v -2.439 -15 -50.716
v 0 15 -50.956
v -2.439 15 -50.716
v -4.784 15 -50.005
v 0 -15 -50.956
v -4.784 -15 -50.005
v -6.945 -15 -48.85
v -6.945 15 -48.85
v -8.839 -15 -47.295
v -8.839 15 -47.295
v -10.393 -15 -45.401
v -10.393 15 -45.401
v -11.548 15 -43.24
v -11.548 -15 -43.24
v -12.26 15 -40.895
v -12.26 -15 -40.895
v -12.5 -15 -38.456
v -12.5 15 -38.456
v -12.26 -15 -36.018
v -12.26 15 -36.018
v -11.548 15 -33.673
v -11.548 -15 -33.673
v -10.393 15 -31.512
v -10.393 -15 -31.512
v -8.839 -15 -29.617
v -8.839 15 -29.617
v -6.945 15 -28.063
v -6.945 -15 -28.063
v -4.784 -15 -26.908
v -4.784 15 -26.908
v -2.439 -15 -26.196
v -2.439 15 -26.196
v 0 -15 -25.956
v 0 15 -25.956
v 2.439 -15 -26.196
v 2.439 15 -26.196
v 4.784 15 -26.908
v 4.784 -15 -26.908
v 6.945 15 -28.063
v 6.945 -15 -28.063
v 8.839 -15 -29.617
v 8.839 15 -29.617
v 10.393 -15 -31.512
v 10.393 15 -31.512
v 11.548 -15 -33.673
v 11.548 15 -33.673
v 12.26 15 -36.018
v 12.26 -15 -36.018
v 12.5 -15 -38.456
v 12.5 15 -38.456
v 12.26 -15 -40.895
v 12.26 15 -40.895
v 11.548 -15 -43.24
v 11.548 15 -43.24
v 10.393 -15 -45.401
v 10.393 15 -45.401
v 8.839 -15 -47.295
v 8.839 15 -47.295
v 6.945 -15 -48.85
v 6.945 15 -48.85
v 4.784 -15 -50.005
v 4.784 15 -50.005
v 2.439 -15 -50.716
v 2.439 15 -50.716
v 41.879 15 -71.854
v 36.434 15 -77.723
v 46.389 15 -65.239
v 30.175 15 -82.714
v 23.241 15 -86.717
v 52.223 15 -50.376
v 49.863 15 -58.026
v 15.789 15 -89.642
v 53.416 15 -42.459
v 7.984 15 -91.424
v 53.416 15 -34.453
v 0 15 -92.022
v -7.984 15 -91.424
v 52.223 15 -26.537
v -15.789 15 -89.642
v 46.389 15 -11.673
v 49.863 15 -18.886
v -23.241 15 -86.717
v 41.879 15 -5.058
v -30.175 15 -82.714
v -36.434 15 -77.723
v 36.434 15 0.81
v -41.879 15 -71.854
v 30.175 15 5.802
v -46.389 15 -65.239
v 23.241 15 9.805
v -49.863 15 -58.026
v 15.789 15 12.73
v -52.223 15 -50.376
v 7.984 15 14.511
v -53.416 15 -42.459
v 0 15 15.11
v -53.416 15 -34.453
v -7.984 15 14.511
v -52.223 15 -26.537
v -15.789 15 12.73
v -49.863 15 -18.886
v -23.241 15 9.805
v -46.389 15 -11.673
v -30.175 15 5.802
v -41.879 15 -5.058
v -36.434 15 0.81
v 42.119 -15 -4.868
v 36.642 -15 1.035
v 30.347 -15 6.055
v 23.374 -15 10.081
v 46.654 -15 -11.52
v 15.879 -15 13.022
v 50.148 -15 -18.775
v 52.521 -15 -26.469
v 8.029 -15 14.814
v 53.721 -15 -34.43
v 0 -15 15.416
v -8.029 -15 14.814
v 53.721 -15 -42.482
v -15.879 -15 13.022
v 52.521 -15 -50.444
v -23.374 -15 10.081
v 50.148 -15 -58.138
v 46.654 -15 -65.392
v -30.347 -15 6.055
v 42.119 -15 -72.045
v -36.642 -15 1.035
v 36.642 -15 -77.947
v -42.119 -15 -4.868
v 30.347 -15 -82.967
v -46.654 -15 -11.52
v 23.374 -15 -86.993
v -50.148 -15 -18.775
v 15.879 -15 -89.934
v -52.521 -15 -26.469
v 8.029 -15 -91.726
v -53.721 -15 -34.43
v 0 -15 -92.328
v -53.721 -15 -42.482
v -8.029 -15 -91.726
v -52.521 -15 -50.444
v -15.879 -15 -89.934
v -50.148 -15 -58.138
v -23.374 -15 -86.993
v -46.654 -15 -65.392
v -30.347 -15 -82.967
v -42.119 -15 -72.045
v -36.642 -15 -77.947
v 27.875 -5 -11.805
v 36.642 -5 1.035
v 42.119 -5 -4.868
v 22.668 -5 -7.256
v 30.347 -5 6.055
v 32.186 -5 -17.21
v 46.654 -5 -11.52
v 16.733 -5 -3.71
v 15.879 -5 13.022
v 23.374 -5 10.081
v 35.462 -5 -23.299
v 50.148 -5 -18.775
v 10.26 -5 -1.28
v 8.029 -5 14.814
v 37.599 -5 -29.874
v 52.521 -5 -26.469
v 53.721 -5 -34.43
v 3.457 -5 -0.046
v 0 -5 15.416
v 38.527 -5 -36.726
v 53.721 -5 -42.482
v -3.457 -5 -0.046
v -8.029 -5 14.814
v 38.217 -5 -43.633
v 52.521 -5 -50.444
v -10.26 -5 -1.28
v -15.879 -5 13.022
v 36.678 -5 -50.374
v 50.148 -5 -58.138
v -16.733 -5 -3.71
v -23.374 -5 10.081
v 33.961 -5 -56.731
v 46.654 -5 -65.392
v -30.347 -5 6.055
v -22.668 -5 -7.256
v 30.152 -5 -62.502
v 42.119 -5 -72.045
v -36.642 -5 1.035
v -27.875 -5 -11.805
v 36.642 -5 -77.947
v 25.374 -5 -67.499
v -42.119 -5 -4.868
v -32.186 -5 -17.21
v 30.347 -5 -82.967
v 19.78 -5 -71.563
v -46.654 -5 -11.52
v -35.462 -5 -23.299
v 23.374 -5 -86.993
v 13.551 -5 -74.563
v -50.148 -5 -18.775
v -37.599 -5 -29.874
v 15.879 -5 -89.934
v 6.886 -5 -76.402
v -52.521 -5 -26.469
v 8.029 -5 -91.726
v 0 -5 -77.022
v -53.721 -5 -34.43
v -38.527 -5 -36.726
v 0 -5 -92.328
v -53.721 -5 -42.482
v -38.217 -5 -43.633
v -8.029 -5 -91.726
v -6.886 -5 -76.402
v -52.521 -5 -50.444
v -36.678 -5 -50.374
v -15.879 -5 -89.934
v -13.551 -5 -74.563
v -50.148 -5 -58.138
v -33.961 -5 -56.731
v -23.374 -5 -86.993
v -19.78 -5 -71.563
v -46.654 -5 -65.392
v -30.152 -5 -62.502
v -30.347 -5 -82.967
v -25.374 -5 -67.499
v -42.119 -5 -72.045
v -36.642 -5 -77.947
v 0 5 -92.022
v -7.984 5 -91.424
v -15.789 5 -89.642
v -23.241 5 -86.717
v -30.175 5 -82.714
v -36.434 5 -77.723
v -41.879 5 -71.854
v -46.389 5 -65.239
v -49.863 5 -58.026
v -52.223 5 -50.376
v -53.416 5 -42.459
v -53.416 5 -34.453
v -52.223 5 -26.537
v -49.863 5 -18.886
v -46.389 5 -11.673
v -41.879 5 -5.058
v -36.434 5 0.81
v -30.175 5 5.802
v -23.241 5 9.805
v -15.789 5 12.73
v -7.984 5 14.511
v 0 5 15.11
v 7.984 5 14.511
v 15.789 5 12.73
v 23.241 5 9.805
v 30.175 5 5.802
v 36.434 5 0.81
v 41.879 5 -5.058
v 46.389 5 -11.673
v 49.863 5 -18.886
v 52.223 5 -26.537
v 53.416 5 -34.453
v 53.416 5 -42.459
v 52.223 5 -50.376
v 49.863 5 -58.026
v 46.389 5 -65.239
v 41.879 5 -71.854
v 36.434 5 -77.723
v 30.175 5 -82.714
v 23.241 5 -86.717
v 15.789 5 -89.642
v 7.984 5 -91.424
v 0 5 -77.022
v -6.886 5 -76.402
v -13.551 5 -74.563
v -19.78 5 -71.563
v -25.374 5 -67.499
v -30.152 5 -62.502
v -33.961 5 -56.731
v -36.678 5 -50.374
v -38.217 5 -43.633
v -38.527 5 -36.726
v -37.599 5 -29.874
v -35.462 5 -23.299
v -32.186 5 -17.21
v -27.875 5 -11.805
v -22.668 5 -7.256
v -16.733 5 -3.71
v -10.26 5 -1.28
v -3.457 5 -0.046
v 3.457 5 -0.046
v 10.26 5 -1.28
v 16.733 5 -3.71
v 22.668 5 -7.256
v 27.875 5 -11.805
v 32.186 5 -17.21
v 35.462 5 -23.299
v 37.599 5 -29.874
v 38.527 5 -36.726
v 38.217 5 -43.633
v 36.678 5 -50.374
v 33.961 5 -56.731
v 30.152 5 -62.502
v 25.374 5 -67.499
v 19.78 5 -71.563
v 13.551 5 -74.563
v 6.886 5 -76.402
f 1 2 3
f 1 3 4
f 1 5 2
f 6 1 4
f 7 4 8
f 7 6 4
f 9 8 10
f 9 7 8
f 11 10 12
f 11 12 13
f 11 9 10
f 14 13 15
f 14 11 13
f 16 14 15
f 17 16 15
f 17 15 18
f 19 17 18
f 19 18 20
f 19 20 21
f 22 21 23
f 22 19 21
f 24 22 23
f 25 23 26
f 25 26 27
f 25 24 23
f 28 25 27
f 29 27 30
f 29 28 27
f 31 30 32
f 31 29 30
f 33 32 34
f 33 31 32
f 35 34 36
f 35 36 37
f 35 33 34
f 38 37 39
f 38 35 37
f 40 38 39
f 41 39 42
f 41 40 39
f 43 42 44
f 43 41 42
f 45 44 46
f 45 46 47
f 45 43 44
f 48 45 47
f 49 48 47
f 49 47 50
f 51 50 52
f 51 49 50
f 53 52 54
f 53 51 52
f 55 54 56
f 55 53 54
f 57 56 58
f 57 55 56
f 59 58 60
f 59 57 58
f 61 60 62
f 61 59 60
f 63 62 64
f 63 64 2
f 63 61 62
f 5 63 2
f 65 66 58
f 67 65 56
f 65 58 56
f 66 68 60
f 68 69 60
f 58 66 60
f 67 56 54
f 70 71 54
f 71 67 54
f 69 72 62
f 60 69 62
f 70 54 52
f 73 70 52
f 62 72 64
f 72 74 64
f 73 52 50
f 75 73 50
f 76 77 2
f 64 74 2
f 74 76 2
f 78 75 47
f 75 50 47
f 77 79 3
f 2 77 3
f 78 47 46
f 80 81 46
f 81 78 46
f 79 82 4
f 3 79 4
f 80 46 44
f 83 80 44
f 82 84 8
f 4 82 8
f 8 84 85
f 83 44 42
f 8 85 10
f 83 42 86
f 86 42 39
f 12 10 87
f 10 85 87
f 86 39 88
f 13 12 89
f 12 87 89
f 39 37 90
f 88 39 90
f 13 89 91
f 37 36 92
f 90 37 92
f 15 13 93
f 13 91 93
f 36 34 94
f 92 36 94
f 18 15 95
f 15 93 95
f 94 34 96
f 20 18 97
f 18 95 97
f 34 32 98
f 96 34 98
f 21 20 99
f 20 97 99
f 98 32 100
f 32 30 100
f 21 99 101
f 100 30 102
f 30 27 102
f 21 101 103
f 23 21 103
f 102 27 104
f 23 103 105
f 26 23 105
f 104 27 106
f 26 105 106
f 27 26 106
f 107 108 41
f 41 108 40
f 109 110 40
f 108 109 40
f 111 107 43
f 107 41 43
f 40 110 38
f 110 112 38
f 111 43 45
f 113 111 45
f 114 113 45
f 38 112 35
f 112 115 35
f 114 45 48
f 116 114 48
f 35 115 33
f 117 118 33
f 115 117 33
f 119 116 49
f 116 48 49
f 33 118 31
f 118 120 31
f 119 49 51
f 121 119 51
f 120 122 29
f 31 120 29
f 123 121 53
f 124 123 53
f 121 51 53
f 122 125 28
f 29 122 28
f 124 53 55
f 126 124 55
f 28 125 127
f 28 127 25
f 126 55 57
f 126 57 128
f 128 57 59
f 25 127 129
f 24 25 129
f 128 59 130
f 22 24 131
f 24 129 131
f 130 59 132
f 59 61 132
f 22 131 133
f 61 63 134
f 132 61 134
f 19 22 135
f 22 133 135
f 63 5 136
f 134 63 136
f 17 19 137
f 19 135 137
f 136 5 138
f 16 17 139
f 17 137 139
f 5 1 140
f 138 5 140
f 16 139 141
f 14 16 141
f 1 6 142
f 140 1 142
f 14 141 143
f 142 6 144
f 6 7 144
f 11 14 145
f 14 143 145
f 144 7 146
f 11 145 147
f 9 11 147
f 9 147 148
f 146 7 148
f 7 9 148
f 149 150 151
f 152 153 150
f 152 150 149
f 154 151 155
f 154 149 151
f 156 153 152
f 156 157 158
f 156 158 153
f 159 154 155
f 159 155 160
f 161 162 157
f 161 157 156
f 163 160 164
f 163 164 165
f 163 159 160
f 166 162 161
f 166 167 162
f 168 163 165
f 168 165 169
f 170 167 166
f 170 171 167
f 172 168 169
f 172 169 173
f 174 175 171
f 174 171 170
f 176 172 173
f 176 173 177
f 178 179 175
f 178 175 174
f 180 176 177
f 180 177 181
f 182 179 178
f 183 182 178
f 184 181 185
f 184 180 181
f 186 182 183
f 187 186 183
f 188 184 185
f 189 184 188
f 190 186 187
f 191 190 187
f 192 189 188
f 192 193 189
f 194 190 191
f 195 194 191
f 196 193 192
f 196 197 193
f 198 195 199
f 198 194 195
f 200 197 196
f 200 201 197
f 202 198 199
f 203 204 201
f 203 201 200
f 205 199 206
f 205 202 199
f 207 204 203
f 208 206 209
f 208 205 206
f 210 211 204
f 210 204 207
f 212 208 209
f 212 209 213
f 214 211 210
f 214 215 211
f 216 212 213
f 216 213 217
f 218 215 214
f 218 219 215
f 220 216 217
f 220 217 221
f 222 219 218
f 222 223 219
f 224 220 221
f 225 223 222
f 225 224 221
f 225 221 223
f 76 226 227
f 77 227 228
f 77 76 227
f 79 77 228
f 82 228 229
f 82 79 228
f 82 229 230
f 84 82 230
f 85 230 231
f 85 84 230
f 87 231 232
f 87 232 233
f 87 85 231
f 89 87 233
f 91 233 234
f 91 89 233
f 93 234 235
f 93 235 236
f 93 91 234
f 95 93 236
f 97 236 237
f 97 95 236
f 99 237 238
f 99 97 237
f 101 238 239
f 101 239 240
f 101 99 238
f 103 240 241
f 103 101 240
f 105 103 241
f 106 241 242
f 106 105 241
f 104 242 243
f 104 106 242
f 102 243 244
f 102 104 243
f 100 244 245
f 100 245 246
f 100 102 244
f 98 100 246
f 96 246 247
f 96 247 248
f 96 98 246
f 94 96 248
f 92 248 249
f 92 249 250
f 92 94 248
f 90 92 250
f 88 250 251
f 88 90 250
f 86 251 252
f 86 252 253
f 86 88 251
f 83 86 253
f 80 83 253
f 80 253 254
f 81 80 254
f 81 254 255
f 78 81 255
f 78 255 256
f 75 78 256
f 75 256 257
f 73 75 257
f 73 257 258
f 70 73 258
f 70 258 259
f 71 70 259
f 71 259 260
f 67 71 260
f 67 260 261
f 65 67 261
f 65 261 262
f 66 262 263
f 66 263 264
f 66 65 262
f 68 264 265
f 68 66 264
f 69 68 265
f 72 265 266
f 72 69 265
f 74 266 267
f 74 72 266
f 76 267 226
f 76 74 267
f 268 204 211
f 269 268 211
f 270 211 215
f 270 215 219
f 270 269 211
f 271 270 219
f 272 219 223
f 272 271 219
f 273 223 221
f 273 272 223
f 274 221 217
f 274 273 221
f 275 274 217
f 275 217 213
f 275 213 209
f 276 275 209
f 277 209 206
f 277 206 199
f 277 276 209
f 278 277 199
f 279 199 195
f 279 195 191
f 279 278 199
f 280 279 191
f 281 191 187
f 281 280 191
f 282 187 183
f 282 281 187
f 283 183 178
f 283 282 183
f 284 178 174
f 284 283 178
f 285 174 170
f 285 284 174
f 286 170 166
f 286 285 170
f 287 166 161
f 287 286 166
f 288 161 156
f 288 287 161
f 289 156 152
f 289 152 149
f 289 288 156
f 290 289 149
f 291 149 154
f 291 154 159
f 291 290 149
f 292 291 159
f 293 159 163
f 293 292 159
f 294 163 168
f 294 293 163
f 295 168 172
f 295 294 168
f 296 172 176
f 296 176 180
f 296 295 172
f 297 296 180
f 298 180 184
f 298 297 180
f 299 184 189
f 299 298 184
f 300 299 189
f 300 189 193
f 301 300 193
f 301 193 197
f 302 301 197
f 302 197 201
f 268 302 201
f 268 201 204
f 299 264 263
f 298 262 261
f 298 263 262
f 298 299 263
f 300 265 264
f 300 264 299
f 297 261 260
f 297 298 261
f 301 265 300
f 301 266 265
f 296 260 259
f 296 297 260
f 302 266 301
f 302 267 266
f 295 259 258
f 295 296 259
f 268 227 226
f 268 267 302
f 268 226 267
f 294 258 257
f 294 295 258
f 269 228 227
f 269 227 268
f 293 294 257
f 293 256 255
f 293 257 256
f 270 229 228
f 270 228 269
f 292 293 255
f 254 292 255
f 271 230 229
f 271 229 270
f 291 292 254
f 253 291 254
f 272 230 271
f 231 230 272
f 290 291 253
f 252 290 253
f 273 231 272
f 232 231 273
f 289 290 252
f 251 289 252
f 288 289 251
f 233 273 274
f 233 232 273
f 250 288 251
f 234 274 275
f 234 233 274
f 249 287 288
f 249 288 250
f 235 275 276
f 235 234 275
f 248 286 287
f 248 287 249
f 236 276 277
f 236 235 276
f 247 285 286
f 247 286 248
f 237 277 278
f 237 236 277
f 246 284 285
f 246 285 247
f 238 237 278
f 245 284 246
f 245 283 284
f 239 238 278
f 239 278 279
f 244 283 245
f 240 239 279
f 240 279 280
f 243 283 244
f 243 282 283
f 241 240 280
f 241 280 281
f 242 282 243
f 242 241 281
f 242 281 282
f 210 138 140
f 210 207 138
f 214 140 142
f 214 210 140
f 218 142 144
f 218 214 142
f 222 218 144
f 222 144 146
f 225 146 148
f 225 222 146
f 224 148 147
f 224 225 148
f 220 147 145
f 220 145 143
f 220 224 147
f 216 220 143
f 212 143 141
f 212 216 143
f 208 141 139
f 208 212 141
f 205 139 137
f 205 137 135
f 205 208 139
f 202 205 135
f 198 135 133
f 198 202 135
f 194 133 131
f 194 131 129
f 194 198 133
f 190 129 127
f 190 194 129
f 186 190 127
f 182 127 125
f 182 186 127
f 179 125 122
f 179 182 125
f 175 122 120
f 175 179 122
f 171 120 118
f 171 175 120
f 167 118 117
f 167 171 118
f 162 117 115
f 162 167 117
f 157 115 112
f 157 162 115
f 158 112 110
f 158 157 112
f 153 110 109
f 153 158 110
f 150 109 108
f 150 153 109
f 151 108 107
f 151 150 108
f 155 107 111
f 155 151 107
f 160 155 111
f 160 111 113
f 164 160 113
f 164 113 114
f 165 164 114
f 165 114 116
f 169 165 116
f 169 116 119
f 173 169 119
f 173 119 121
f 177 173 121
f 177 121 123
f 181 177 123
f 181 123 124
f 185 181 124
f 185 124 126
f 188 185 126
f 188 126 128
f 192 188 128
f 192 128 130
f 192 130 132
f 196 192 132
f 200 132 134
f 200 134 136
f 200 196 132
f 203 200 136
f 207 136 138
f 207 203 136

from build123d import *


with BuildPart() as part:
    # Sketch1 → Revolve1 (revolve)
    with BuildSketch(Plane.YZ, mode=Mode.PRIVATE) as revolve1_sk:
        Polygon((-14.999881438, 0.027408751), (-14.999881438, 15.415581909), (-4.999994159, 15.415581909), (-4.999994159, 0.109652172), (5.000005829, 0.109652172), (5.000005829, 15.109652172), (15.000005829, 15.109652172), (15.000005829, 0.109652172), (15.000005829, -25.956139131), (-14.999881438, -25.956139131), align=None)
    revolve(revolve1_sk.sketch.rotate(Axis((0, -15, -38.456139131), (0, 1, 0)), 180), axis=Axis((0, -15, -38.456139131), (0, 1, 0)))


solid = part.part
